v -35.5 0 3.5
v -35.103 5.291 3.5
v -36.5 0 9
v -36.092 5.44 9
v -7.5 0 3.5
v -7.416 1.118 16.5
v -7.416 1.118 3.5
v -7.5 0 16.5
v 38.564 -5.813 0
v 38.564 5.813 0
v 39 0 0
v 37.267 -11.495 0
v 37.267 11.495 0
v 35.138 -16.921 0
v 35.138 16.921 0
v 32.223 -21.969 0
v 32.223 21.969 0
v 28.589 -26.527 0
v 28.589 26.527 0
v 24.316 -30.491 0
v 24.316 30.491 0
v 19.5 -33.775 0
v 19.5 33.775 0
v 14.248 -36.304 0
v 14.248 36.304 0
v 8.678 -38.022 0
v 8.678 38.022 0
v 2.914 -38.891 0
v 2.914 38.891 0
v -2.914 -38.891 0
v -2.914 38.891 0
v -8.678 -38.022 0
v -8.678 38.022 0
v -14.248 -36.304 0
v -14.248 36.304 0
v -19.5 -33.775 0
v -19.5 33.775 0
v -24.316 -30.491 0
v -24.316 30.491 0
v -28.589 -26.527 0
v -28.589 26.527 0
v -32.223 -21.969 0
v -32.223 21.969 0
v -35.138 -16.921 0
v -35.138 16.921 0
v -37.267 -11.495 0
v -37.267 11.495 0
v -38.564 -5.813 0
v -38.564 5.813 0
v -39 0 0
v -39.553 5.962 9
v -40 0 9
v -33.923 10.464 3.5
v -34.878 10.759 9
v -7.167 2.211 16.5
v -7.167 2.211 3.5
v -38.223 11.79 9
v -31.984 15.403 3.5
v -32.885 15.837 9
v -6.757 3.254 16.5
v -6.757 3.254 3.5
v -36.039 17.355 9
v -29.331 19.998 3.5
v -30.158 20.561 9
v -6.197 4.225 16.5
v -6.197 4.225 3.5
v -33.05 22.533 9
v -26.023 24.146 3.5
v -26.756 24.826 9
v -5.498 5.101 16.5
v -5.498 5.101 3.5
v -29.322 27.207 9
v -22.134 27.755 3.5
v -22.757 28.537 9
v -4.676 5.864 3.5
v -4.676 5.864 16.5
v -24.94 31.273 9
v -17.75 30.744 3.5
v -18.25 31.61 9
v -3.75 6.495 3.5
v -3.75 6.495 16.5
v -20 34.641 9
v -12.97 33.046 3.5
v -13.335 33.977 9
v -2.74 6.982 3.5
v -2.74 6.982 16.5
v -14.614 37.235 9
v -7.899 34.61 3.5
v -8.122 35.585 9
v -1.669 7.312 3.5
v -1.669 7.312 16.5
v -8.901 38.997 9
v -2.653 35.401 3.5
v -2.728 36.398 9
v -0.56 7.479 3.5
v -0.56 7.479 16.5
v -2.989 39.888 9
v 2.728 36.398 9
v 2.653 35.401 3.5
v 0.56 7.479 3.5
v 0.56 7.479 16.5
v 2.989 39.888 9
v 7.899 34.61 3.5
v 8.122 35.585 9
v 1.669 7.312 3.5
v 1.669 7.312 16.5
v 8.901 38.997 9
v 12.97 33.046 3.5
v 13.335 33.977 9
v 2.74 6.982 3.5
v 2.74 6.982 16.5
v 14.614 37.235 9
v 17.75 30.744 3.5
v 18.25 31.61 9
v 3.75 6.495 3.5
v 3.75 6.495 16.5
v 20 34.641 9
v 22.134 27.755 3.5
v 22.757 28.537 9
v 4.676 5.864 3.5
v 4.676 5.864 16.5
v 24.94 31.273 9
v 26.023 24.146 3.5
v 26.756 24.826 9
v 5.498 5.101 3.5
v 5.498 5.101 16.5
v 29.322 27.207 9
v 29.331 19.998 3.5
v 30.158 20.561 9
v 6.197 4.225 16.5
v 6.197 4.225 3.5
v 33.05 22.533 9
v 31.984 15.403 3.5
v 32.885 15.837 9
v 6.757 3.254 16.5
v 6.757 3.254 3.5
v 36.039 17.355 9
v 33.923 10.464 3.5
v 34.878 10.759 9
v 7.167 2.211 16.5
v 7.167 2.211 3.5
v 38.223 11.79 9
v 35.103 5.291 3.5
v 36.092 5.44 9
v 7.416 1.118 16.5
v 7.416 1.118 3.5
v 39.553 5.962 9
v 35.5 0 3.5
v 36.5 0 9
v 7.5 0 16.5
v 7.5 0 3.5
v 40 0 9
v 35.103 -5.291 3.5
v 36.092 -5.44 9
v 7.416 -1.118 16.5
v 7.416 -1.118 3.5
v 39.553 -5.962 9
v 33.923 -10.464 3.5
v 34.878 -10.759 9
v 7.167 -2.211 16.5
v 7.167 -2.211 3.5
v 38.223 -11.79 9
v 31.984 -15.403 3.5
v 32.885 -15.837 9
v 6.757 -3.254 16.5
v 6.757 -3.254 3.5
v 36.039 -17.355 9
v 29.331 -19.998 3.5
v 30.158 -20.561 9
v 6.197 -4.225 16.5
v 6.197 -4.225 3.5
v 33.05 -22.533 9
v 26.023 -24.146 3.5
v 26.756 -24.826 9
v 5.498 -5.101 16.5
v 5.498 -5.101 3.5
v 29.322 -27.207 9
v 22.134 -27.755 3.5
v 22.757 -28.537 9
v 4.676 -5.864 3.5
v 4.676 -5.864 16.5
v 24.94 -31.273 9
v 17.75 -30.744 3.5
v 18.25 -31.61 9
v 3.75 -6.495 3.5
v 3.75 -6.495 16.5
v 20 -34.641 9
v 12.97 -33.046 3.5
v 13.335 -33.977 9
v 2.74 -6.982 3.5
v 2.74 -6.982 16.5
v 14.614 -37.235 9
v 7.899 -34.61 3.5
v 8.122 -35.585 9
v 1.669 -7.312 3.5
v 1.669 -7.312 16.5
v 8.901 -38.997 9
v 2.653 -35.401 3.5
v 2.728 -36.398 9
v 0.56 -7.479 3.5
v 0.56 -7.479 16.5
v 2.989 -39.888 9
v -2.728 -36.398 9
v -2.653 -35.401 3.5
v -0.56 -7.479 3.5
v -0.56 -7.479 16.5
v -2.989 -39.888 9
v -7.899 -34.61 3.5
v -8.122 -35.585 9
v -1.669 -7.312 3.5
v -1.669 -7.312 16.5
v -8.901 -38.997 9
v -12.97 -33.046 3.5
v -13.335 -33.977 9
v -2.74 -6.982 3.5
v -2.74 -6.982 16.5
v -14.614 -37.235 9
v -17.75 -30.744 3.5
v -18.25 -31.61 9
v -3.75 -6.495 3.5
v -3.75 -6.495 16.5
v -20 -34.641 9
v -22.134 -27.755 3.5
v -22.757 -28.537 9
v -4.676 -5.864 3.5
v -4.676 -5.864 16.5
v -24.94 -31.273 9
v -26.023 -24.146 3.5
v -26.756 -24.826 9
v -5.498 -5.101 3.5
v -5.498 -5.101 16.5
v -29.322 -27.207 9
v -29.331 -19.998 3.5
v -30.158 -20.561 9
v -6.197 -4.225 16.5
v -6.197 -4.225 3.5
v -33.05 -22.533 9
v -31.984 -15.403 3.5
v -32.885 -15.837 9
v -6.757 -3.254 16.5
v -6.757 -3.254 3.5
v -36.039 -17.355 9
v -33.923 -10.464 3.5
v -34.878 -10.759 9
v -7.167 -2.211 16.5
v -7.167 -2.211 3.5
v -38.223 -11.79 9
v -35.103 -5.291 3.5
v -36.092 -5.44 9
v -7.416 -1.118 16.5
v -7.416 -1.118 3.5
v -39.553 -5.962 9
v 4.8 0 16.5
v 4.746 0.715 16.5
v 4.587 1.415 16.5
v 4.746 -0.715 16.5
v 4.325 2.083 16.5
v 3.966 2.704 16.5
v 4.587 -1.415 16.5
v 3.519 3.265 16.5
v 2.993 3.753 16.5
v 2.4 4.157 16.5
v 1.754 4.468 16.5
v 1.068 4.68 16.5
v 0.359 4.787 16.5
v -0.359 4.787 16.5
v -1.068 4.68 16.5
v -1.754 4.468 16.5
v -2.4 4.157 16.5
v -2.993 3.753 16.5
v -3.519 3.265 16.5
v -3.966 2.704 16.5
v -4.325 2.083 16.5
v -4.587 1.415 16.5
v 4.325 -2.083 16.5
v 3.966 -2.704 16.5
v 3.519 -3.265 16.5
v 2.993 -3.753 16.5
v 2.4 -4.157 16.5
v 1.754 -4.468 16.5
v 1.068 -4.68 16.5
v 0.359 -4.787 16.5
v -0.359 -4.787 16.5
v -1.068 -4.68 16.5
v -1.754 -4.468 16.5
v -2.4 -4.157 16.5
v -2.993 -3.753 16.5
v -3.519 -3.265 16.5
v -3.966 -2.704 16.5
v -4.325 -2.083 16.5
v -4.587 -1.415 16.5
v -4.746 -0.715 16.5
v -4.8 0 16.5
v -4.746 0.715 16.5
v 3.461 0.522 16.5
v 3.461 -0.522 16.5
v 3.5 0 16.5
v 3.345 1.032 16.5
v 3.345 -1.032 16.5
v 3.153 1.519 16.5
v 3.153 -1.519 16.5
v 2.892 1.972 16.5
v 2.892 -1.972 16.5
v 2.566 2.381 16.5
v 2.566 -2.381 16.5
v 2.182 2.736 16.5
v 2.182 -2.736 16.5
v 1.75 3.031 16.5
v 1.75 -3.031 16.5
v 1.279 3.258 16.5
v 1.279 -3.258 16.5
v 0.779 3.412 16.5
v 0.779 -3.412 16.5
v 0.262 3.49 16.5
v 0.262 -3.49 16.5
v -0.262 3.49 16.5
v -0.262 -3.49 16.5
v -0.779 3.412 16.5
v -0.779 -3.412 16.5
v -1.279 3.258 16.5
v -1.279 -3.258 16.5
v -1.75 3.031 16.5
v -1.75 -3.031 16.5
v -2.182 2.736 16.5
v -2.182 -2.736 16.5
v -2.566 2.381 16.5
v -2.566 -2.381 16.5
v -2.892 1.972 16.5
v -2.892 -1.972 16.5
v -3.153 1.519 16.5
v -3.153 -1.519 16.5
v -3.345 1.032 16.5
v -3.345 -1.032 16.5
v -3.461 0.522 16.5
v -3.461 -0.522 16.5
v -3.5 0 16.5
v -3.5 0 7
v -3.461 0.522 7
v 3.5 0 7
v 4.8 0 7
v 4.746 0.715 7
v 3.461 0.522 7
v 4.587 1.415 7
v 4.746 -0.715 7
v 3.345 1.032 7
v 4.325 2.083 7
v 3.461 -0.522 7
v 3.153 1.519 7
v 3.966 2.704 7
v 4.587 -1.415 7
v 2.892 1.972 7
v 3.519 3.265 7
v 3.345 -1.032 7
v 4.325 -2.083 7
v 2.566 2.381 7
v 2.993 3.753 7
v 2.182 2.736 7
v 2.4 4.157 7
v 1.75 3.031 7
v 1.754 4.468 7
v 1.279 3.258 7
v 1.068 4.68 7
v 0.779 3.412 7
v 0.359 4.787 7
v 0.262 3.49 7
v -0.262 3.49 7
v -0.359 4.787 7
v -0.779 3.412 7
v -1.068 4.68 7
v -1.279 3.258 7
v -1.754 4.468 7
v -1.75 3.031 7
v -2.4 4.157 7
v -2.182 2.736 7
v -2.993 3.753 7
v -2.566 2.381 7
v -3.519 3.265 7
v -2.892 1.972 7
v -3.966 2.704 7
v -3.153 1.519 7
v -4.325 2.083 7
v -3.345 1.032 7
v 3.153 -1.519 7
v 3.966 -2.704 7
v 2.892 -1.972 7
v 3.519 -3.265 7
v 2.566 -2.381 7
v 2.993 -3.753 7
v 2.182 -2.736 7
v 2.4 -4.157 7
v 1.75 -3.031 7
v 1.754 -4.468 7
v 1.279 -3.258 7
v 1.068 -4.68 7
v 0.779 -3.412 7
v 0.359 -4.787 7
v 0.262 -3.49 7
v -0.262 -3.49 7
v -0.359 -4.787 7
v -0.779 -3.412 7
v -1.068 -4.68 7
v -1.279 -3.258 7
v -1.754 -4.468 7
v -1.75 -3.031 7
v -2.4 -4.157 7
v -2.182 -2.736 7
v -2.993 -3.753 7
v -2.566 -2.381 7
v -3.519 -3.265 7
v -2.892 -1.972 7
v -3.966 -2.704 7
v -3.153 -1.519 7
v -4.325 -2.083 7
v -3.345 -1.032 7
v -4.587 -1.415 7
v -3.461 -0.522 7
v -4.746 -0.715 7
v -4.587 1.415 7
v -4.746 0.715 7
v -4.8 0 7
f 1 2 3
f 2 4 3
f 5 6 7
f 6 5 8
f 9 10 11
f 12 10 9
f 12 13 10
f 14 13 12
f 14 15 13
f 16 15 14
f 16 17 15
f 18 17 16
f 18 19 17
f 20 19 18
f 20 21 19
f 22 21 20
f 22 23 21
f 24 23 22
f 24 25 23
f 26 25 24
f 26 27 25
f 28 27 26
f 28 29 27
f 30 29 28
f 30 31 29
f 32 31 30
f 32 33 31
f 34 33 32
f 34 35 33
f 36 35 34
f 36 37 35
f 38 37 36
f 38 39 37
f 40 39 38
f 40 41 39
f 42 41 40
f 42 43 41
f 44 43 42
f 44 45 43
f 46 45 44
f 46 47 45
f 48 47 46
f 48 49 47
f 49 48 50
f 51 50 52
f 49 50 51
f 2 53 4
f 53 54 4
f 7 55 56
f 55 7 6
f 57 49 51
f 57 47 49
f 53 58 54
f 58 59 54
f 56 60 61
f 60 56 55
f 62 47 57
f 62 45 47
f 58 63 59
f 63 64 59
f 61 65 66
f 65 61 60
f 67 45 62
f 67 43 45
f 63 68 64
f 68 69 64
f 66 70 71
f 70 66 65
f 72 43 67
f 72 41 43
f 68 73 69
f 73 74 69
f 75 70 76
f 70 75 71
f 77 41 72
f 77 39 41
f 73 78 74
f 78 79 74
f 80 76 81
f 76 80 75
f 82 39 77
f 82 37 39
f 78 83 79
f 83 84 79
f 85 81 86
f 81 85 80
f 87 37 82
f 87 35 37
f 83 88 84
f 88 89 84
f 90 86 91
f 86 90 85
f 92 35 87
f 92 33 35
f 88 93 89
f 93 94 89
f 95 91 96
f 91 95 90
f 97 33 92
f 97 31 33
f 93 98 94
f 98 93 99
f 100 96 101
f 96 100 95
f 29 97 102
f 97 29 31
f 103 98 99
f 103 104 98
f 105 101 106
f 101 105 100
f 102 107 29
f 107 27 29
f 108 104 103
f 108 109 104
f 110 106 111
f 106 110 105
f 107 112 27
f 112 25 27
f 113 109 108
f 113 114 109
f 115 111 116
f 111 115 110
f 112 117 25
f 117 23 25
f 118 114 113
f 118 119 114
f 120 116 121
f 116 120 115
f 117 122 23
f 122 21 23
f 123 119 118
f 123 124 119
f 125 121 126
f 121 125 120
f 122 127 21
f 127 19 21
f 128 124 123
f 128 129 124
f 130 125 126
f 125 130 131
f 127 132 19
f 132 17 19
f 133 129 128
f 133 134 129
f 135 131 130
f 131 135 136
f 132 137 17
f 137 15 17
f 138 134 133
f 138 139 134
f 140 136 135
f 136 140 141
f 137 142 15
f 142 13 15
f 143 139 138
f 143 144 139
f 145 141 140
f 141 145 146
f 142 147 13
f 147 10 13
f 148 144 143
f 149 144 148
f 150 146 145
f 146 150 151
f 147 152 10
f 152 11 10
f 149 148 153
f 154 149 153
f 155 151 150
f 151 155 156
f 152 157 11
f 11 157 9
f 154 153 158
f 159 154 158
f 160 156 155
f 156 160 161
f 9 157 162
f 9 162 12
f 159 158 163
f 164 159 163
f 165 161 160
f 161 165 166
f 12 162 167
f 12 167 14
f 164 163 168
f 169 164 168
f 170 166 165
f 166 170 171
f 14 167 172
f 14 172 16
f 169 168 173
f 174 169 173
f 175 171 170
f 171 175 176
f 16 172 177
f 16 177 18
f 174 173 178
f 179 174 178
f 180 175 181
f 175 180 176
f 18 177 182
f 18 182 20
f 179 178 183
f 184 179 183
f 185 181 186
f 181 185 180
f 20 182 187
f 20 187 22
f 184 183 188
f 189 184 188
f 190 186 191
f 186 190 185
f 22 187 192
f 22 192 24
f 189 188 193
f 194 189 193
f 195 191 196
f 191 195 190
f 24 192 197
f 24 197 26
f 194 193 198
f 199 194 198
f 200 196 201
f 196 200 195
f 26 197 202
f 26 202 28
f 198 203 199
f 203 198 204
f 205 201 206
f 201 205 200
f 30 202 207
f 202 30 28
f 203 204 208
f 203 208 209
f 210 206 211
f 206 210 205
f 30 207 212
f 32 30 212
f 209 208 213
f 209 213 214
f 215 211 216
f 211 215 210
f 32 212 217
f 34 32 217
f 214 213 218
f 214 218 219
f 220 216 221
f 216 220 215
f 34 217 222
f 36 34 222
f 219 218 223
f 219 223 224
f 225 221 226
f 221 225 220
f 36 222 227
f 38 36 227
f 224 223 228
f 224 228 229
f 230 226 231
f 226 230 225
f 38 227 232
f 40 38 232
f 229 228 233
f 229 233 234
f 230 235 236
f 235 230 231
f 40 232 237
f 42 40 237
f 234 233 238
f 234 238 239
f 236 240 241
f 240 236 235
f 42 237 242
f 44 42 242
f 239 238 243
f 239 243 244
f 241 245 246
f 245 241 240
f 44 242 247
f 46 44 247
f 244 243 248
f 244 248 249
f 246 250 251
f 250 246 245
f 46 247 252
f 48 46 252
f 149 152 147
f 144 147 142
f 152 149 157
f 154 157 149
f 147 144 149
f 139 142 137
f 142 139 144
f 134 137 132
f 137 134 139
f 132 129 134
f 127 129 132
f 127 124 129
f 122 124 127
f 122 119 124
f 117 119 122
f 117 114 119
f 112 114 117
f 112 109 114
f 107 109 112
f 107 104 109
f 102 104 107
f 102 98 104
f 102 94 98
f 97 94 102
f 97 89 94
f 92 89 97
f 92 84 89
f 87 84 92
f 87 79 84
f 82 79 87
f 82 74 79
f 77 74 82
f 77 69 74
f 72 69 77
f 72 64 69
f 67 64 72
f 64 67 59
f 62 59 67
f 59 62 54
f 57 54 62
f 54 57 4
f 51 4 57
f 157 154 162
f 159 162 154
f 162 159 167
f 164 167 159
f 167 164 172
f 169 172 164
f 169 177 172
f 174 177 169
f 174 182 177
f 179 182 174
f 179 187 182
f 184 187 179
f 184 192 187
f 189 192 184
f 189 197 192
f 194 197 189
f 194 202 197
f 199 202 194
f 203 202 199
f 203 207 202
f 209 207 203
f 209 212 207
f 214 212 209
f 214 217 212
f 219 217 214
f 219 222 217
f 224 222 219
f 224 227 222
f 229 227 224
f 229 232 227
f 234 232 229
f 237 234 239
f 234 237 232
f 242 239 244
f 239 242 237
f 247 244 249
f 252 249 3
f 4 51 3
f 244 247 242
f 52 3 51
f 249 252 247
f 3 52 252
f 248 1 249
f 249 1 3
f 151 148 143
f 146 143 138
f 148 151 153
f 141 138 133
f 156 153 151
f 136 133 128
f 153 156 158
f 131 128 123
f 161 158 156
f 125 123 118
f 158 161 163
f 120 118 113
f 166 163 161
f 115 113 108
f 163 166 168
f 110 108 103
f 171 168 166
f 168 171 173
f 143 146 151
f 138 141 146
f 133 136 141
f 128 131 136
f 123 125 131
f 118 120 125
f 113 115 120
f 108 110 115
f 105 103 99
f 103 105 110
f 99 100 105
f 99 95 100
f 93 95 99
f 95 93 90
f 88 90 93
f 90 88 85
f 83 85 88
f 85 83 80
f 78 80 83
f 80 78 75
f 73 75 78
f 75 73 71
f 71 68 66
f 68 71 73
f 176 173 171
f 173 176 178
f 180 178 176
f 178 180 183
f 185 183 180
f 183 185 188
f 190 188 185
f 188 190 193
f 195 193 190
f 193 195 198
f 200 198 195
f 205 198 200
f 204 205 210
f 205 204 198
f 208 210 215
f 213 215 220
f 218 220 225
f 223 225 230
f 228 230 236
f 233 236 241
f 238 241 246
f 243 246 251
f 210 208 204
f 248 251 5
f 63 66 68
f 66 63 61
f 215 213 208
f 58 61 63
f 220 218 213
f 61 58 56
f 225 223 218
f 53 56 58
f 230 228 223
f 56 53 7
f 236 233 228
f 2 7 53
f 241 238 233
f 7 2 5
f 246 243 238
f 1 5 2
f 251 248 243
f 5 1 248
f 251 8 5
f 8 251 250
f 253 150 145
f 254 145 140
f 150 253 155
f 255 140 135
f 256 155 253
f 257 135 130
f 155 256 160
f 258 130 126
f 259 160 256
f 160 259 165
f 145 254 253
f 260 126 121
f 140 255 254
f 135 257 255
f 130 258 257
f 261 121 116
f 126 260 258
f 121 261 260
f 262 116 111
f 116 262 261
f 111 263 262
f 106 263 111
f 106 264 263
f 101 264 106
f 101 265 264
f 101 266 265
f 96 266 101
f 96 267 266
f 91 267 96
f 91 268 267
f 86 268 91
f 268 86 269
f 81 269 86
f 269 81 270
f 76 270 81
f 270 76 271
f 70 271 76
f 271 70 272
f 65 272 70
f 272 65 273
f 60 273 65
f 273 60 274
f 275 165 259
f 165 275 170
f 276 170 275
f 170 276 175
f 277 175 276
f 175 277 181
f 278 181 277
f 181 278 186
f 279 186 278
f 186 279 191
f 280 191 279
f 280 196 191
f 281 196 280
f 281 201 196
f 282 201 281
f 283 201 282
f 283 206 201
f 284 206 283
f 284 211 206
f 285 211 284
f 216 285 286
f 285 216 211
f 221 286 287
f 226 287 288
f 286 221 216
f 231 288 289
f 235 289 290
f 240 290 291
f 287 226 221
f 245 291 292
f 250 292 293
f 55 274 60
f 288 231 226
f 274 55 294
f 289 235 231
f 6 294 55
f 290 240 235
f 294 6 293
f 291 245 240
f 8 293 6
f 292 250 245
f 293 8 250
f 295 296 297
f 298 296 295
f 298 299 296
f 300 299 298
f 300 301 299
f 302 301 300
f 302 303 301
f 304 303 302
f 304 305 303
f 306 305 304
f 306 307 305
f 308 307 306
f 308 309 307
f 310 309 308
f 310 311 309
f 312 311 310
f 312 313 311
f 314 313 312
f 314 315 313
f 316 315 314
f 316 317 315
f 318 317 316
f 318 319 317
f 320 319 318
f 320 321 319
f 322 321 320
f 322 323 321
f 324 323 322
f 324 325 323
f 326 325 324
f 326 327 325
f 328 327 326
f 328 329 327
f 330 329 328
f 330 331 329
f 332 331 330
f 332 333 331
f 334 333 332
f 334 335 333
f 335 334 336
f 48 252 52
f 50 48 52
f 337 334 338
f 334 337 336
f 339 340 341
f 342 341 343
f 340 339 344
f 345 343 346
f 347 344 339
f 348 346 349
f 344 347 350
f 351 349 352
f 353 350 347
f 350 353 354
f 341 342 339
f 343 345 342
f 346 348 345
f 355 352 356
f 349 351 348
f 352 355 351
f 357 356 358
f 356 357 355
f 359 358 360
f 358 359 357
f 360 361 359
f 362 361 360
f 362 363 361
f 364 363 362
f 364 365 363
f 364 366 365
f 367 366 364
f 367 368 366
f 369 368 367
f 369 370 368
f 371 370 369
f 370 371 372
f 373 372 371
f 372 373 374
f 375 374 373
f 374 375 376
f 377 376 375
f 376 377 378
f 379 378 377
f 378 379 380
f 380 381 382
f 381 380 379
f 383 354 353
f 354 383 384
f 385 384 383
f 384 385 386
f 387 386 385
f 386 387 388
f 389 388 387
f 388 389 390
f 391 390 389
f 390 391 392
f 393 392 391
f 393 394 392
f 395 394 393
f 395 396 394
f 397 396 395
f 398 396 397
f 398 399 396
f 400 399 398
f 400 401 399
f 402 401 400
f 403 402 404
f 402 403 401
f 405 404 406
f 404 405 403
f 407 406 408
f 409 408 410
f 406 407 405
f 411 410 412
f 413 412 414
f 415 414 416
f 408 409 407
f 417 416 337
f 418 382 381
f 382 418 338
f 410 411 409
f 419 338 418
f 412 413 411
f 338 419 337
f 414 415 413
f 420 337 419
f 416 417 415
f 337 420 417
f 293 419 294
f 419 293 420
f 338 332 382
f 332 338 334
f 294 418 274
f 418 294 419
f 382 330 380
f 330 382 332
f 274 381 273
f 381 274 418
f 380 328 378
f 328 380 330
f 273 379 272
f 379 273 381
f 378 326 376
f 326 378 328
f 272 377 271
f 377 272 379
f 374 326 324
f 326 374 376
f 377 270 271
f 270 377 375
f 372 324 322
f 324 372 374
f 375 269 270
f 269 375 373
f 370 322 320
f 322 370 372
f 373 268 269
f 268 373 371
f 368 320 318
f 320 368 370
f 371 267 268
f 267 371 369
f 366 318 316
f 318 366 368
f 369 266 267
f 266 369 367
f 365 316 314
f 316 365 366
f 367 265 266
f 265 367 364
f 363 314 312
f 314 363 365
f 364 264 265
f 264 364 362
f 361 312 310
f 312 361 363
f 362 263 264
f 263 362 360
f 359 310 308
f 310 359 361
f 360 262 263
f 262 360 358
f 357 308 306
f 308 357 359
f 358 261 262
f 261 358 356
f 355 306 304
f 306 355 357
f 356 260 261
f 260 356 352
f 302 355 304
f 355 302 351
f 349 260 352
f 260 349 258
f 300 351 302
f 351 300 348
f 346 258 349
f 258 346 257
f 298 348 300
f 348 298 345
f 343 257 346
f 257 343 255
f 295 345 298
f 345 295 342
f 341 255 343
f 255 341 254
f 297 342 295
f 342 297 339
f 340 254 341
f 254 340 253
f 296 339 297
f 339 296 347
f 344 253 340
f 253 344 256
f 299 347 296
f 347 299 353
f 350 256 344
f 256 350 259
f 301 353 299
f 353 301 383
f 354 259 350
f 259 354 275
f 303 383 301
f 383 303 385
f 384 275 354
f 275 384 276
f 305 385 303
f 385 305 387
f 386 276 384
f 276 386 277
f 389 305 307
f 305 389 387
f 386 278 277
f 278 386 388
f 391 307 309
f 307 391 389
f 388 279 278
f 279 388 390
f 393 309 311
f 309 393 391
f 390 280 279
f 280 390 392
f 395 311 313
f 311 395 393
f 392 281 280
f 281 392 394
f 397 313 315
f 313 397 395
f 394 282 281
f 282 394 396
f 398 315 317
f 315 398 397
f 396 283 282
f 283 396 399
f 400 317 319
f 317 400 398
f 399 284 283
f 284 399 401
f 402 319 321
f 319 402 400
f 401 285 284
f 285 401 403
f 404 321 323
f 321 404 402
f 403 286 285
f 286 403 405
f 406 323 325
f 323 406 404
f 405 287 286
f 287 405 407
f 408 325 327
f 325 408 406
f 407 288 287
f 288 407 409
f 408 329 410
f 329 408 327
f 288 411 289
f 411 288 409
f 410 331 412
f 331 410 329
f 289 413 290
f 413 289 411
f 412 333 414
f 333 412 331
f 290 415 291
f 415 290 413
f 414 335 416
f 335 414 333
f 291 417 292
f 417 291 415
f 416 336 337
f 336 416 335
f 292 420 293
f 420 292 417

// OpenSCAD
/* [Cube] */
// preview[view:south, tilt:top]

mode = "Final";//[Draft, Final]

// in mm
peg_height = 13;
// in mm
peg_top_radius = 7.5;
// in mm
center_radius = 39;
// in mm
outer_radius = 40;
// in mm
tray_depth_mm = 9;

// in mm
stick_thickness = 1.3;

stick_length = 200;//Optional for final model, useful for visualization

sides = 42;
// in mm
wall_thickness = 3.5;
// in mm
floor_thickness = 3.5;

//overhang ratio, 0-1; 0 = burns straight up and down, 1 = the edge of the incense will meet the edge of the tray in a right angle. Maxium suggested is 0.8, maxes out at 1;
overhang_ratio = 0.0;

/* [Hidden] */
// ignore variable values
PI = 3.141592653589793238;
//  A
//  |\
//  | \
//a |  \ c
//  |   \
//  |    \
//  |_____\
//     b
// We know that
// c = stick_length
// b = outer_radius * overhang_ratio
//  and
// a^2 + b^2 = c^2
// so
// a^2 = c^2 - b^2
c = stick_length;
b = outer_radius * min(overhang_ratio, 1);
bPow2 = pow(b, 2);
cPow2 = pow(c, 2);
aPow2 = cPow2 - bPow2;
a = sqrt(aPow2);
// Great, now we need to get the angle for A
// which is the sin(b/c)

stickAngle = asin(b/c);
module stick(){
  rotate([0, stickAngle, 0])
    translate([max(peg_top_radius * 0.3, floor_thickness), 0, stick_length / 2 + floor_thickness])
      cube([stick_thickness, stick_thickness, stick_length], center=true);
}
if (mode == "Draft") {
  stick();
}

//co center_outer 
//bo bottom_outer 
//to top_outer 
//ti top_inner 
//bi bottom_inner 
//ci center_inner 

// This is the shape v1. Note that cu and co are not completed
// the whole shape is rotated to complete the shape
//                 ti---to
//                 |     |
//  ci------------bi     |
//                       |
//  co------------------bo
//
// Shape V2
//                 ti---to
//  ci--pt         |     |
//      pb--------bi     |
//                       |
//  co------------------bo
//pt=stick_thickness, peg_height 
//pb=stick_thickness, tray_depth 

center_outer = [0,                              0];//[hidden]
bottom_outer = [center_radius,                  0];//[hidden]
top_outer = [outer_radius,                      tray_depth_mm];//[hidden]
top_inner = [outer_radius - wall_thickness,     tray_depth_mm];//[hidden]
bottom_inner = [center_radius - wall_thickness, floor_thickness];//[hidden]
peg_bottom =   [peg_top_radius,                 floor_thickness];//[hidden]
peg_top =      [peg_top_radius,                 peg_height+floor_thickness];//[hidden]
center_inner = [0,                              peg_height+floor_thickness];//[hidden]

module round_tray(offset, bottomOffset){ 
  
  rotate_extrude($fn=sides) 
    polygon( points=[
      center_outer,
      bottom_outer,
      top_outer,
      top_inner,
      bottom_inner,
      peg_bottom,
      peg_top,
      center_inner
    ]
  );
}


//New Cone
//    nti---nto
//     |     |
//     |     |
//     |     |
//     |     |
//    nci---nco

cone_center_offset = max(peg_top_radius * 0.3, floor_thickness);

cone_center_outer =  [cone_center_offset + stick_thickness, 0];
cone_top_outer =     [cone_center_offset + stick_thickness, peg_height];
cone_top_inner =     [cone_center_offset,                   peg_height];
cone_center_inner =  [cone_center_offset,                   0];

module cone_tray(){
  rotate_extrude($fn=sides)
    rotate([0,0, -stickAngle])//stickAngle
      translate([0, floor_thickness, peg_height/2])
        polygon( points=[
          cone_center_outer,
          cone_top_outer,
          cone_top_inner,
          cone_center_inner
        ]
      );
}


//OLD CONE
//              nti---nto
//              /     /
//             /     /
//            /     /
//           /     /
//          /     /
//         /     /
//       nci---nco

// cone_center_offset = min(peg_top_radius * 0.3,floor_thickness);
// cone_center_outer =  [cone_center_offset + stick_thickness, 0];
// cone_top_outer =     [peg_top_radius+stick_thickness,      peg_height];
// cone_top_inner =     [peg_top_radius,      peg_height];
// cone_center_inner =  [cone_center_offset, 0];
// 
// 
// module cone_tray(){
//    rotate_extrude($fn=sides)
//      rotate([0,0,offset_tip_sticks_whole])
//        polygon( points=[
//         cone_center_outer,
//         cone_top_outer,
//         cone_top_inner,
//         cone_center_inner
//       ]
//   );
// }

difference(){
//number_of_sticks
//stick_thickness
  round_tray(0,0.1);
  translate([0,0,floor_thickness])
    cone_tray();
  
};
